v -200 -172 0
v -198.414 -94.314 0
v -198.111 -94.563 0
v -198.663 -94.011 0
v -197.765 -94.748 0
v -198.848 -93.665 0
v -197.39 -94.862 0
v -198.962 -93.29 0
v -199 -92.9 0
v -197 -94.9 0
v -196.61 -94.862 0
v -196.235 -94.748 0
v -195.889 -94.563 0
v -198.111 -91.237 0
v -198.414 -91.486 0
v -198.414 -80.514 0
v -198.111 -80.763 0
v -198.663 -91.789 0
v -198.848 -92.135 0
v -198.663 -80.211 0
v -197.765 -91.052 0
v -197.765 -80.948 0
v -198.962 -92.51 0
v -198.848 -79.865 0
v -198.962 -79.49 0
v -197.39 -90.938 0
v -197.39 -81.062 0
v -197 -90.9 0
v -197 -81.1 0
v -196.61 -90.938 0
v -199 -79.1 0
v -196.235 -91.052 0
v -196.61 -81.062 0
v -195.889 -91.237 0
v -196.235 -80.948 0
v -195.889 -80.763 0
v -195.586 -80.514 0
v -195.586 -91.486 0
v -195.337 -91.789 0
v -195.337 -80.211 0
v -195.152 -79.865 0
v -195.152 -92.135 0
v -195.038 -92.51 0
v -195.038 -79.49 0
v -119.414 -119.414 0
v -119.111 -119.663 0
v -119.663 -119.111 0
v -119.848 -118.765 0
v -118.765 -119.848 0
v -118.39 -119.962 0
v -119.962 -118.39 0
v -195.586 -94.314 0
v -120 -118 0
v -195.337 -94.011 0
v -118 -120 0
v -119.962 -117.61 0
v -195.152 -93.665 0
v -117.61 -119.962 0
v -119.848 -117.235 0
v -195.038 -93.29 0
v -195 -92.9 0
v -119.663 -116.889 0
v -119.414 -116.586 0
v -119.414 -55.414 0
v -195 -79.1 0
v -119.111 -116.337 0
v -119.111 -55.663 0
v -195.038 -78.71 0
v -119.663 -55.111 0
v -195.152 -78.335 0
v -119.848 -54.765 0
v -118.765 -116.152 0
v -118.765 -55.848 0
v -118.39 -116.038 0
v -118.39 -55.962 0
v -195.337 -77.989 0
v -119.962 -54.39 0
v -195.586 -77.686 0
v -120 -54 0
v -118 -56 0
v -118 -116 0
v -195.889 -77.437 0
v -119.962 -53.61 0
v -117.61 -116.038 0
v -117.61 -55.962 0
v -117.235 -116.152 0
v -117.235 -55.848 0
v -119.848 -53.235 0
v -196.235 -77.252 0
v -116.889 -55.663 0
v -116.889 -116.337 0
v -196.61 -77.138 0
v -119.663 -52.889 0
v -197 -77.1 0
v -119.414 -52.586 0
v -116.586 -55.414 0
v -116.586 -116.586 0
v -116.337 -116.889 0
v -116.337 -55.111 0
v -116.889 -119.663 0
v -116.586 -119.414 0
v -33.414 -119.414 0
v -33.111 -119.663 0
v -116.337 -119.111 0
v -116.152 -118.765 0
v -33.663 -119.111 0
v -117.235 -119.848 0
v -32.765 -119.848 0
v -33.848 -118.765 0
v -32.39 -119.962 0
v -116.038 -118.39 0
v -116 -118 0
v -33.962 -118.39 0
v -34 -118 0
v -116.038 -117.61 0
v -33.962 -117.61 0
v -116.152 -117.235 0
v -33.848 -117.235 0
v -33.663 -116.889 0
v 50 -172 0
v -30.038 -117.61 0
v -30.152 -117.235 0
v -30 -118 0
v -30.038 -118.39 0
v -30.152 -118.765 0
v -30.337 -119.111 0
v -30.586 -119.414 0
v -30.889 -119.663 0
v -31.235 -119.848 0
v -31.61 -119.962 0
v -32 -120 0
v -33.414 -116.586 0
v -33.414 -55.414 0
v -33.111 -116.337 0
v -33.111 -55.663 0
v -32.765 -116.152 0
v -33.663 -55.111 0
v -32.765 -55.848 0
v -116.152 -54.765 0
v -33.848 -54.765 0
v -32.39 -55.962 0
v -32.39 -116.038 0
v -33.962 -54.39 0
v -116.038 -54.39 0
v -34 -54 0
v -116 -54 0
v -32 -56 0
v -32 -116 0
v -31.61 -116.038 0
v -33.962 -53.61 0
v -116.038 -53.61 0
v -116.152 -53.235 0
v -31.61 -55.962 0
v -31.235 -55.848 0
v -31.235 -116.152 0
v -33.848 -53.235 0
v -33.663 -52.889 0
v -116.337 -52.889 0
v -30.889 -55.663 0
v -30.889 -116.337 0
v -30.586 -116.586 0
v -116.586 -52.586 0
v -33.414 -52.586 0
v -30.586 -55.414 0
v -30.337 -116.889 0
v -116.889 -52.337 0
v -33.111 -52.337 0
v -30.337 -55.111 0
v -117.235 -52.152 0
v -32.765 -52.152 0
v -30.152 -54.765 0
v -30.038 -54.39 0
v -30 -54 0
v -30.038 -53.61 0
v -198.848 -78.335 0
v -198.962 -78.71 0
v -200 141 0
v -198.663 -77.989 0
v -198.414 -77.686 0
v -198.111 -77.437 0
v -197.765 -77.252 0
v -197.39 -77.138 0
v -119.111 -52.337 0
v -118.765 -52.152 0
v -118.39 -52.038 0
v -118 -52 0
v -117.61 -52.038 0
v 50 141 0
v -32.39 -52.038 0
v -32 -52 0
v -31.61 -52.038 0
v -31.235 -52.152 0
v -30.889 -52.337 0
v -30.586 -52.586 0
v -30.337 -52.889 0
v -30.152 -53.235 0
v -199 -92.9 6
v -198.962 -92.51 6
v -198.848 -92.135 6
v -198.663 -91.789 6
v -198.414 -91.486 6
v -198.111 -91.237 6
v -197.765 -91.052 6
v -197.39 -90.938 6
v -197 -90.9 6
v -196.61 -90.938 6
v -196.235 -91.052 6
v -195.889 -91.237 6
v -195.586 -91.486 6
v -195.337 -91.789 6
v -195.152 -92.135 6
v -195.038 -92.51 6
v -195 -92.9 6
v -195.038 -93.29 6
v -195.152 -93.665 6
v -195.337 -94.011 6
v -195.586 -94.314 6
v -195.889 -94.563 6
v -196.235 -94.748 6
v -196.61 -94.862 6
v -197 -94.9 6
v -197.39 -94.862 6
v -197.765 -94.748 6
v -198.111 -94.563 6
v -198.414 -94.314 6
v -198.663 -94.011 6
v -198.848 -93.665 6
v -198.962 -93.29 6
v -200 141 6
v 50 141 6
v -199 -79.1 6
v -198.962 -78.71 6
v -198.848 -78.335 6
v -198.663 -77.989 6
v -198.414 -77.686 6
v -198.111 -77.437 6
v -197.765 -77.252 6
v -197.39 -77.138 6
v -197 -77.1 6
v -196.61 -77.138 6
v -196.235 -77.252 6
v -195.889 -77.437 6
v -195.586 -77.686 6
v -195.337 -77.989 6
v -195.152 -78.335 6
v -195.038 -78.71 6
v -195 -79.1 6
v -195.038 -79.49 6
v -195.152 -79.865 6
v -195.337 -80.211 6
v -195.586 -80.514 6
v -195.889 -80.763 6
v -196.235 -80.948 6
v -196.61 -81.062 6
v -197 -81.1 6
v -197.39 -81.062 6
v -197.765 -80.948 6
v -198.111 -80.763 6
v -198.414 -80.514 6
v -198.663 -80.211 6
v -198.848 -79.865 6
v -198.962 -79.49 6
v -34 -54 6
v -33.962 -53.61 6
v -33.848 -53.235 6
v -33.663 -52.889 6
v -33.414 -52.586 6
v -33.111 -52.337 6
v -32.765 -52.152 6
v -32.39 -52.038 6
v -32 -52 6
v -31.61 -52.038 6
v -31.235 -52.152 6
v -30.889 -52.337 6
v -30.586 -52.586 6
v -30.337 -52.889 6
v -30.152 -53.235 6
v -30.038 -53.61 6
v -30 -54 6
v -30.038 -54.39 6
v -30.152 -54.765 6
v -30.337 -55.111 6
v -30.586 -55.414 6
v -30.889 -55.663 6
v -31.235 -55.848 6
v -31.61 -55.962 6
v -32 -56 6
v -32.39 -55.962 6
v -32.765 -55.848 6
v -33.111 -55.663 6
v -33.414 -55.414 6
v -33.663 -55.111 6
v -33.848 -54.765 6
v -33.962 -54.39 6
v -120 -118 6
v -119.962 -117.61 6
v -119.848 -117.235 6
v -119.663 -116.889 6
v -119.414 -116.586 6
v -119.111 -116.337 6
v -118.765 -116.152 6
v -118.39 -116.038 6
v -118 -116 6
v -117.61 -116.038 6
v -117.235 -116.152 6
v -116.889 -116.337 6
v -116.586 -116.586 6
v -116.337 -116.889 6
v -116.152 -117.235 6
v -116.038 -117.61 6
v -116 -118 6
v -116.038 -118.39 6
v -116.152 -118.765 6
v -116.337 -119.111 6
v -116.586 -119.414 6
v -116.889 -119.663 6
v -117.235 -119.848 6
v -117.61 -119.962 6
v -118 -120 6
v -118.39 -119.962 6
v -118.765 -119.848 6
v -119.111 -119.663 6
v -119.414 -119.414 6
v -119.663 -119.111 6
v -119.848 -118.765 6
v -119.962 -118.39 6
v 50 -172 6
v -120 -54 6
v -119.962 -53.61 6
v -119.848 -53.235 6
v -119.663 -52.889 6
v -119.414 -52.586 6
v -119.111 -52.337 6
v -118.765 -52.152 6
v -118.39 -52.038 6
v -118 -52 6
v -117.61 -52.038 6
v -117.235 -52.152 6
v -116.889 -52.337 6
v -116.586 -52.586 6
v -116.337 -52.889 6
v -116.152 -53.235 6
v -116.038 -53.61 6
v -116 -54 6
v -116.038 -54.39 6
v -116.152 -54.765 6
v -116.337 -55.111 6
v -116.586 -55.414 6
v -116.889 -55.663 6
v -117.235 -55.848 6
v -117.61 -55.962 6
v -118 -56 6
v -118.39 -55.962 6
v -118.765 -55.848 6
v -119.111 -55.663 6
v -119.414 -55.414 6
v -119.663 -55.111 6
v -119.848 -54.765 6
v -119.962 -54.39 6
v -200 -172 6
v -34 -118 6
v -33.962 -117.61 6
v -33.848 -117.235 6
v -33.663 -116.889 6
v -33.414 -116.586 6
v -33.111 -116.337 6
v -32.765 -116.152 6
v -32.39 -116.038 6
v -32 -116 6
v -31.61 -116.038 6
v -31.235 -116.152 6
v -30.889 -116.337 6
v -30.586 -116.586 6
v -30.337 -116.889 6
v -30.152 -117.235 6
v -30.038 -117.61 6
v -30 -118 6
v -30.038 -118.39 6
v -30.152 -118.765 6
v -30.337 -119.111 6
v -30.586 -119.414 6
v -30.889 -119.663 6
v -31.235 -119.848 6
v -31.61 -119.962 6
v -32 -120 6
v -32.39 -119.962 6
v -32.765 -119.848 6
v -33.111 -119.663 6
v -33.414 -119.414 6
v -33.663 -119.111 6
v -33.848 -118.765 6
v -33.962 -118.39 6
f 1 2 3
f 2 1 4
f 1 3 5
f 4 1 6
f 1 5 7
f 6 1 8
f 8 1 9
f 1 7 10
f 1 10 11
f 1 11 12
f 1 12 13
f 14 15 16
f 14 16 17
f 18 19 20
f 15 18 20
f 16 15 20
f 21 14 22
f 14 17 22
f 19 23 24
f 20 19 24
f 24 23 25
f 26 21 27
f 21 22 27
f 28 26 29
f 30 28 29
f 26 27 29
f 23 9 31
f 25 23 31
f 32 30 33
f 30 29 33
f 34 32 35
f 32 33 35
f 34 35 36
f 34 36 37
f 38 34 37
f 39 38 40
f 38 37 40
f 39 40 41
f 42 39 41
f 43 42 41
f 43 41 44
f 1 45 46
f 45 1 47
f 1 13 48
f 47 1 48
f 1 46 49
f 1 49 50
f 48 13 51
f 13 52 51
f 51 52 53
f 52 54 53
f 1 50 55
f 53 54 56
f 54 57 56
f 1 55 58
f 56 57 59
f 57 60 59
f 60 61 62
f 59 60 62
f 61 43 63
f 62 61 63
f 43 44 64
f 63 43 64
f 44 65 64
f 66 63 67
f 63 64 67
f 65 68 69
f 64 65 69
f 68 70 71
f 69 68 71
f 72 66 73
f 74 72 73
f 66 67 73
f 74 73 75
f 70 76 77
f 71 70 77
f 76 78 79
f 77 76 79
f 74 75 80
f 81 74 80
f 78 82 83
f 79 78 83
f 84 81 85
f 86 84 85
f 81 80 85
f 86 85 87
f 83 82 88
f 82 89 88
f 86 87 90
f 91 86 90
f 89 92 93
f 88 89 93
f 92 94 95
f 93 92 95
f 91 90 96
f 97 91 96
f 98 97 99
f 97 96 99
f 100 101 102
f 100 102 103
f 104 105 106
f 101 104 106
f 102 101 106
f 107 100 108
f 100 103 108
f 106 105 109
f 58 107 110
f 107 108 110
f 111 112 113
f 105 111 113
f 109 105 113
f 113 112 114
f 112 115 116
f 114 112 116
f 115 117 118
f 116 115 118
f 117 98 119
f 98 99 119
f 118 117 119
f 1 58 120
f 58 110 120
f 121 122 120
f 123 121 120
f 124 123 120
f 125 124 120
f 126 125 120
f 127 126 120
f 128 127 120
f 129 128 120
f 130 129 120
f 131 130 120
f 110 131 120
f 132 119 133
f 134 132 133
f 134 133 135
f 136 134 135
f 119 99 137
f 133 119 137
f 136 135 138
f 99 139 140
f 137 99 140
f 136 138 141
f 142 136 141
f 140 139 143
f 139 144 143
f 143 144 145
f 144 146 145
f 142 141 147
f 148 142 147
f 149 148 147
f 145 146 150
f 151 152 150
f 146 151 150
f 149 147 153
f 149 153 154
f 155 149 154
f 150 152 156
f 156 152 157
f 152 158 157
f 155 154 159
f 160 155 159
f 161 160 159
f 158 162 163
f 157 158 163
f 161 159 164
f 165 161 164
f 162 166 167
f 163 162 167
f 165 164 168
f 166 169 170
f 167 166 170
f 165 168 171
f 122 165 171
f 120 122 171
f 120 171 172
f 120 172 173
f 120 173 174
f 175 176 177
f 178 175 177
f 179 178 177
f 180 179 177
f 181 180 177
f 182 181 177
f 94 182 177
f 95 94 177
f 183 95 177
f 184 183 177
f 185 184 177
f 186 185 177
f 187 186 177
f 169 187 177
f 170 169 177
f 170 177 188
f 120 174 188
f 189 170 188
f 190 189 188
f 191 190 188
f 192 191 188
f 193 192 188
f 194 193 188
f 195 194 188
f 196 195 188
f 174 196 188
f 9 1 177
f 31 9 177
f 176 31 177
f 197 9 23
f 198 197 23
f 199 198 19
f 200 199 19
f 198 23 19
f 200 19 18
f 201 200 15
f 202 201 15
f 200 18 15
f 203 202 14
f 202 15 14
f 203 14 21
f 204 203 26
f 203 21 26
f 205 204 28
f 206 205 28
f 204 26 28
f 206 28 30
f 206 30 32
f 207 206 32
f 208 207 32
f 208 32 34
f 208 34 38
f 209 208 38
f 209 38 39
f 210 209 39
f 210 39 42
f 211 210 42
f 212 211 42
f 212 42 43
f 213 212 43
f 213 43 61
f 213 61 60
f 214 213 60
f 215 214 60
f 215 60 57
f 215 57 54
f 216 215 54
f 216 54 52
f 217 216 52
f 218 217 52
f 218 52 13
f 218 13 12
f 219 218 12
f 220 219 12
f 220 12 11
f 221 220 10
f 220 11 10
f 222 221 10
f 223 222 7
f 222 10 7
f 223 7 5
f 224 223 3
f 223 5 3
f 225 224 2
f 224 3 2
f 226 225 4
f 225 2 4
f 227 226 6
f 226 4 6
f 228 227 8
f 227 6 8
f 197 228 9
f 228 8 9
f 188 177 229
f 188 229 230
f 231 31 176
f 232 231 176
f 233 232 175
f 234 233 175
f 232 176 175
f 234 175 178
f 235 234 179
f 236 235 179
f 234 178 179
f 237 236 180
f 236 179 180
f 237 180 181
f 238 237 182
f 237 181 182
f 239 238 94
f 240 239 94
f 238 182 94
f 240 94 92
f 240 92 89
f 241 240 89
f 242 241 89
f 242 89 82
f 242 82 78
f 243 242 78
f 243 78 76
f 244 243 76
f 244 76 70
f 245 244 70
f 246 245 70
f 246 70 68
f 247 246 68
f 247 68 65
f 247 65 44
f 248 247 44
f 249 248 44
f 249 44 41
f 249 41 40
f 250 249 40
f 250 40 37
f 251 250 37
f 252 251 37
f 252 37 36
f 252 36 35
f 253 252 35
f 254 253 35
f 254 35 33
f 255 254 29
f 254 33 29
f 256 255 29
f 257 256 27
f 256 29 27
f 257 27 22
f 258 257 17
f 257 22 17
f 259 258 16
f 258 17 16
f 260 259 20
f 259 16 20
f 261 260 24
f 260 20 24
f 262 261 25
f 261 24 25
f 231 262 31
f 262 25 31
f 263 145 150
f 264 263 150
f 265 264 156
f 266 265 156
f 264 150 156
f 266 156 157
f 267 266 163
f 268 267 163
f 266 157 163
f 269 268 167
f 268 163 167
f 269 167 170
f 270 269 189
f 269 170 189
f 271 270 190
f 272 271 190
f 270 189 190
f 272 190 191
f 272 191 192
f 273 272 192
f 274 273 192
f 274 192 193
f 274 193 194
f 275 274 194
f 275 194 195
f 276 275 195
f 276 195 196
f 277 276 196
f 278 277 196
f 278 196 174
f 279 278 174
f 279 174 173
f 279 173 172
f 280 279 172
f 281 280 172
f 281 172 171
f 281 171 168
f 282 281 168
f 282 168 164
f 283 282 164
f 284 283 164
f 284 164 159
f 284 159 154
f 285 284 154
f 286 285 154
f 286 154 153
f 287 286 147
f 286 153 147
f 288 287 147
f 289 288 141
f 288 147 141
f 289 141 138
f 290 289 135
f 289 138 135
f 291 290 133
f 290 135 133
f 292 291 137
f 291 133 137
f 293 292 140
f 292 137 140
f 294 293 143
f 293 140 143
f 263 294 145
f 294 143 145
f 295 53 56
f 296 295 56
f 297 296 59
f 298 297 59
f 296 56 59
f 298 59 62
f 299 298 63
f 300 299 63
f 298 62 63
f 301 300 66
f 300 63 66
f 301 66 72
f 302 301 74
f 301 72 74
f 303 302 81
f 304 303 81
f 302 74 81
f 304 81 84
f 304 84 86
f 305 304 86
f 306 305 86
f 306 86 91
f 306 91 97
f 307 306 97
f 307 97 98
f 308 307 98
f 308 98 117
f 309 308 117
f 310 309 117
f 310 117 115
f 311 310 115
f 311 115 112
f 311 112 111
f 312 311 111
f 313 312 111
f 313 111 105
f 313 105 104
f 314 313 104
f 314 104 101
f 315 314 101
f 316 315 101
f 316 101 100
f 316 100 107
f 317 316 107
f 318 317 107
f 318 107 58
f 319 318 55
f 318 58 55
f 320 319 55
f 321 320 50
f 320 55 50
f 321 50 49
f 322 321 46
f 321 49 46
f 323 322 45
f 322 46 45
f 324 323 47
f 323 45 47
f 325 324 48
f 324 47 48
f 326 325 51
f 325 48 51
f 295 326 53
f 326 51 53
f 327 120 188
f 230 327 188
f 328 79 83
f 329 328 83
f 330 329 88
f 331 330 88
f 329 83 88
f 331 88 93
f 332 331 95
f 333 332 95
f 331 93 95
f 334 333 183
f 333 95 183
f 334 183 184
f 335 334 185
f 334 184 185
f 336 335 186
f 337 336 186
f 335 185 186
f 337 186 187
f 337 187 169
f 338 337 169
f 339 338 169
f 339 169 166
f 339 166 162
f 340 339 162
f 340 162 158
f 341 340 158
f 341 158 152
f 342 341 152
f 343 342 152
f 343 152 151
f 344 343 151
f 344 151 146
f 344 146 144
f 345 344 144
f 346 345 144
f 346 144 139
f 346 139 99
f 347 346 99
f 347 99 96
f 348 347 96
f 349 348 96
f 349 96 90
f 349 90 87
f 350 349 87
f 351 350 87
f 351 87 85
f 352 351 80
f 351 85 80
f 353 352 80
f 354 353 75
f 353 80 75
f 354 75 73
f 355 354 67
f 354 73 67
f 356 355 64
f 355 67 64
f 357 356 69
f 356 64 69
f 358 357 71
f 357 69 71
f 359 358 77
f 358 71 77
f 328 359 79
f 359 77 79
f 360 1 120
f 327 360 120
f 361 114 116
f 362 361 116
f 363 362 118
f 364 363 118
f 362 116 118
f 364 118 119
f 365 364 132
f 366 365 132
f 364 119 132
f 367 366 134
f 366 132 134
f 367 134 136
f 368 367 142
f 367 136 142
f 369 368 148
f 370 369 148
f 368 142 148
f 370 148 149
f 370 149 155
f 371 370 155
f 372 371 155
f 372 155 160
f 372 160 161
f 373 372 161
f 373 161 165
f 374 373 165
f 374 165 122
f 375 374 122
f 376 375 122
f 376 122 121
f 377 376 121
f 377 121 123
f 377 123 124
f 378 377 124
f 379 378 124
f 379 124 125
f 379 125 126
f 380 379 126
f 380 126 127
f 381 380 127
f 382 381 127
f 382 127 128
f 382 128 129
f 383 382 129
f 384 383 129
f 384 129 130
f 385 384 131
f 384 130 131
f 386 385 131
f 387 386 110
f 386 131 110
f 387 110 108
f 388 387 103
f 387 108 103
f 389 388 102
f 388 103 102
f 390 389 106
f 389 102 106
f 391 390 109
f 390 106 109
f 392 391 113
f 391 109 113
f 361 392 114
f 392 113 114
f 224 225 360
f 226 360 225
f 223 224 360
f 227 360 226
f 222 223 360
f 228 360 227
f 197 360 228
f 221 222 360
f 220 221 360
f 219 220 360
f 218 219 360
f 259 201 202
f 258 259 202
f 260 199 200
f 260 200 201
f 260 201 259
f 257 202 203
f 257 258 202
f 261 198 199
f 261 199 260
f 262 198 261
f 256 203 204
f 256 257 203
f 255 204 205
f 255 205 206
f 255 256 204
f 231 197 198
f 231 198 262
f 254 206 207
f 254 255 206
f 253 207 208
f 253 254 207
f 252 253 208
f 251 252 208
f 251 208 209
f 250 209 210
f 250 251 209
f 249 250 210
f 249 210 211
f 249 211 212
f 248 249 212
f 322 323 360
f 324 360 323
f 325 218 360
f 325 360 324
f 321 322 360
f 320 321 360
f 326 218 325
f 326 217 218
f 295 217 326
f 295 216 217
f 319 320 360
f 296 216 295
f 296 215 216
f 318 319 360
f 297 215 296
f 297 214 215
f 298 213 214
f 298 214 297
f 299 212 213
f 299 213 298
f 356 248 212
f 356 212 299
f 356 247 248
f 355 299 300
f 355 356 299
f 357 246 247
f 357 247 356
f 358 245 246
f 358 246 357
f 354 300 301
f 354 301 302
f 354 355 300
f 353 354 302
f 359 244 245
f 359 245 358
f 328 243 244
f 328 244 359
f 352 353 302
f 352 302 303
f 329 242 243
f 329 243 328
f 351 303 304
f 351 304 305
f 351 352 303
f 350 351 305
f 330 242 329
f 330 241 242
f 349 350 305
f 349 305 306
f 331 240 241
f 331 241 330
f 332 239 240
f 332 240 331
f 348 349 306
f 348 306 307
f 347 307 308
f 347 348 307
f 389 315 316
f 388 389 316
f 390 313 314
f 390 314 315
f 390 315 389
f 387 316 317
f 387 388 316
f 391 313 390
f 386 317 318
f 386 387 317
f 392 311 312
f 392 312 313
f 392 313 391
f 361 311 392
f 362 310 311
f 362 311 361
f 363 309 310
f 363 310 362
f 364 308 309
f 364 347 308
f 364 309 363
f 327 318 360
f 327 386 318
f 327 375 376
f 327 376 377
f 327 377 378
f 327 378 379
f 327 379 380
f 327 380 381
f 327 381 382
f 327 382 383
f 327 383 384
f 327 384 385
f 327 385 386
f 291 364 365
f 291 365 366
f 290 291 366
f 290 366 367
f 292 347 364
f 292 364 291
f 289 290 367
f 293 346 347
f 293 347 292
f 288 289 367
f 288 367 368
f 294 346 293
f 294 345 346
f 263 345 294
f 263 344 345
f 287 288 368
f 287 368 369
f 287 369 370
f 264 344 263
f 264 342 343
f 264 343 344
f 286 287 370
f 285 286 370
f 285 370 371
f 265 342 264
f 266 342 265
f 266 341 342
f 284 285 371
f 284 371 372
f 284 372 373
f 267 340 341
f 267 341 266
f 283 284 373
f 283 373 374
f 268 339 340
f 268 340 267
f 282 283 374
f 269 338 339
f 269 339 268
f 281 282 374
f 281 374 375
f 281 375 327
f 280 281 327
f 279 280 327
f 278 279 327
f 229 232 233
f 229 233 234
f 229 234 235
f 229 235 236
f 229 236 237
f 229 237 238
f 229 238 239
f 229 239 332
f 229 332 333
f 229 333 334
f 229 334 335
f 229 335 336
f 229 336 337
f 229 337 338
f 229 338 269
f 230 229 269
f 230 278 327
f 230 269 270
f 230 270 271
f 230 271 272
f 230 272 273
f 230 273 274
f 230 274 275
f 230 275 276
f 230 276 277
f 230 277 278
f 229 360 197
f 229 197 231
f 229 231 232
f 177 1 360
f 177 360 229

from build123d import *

# Parameters (mm, degrees)
ESQUISSE1_W             = 250
ESQUISSE1_H             = 313
BOSS_EXTRU_1_DEPTH      = 6
ENL_V_MAT_EXTRU_1_REACH = 265.856
ESQUISSE2_R             = 2
ENL_V_MAT_EXTRU_2_REACH = 265.856
ESQUISSE3_R             = 2


with BuildPart() as part:
    # Esquisse1 → Boss.-Extru.1 (new body)
    with BuildSketch(Plane.XY):
        with Locations((-75, -15.5)):
            Rectangle(ESQUISSE1_W, ESQUISSE1_H)
    extrude(amount=BOSS_EXTRU_1_DEPTH)

    # Esquisse2 → Enlèv. mat.-Extru.1 (cut, up to next)
    with BuildSketch(Plane(origin=(0, 0, 0), x_dir=(-1, 0, 0), z_dir=(0, 0, -1)), mode=Mode.PRIVATE) as enl_v_mat_extru_1_sk1:
        with Locations((32, -54)):
            Circle(ESQUISSE2_R)
    enl_v_mat_extru_1_tool1 = extrude(enl_v_mat_extru_1_sk1.sketch, amount=-ENL_V_MAT_EXTRU_1_REACH, mode=Mode.PRIVATE) & part.part
    # Esquisse2 → Enlèv. mat.-Extru.1 (cut, up to next)
    with BuildSketch(Plane(origin=(0, 0, 0), x_dir=(-1, 0, 0), z_dir=(0, 0, -1)), mode=Mode.PRIVATE) as enl_v_mat_extru_1_sk2:
        with Locations((118, -54)):
            Circle(ESQUISSE2_R)
    enl_v_mat_extru_1_tool2 = extrude(enl_v_mat_extru_1_sk2.sketch, amount=-ENL_V_MAT_EXTRU_1_REACH, mode=Mode.PRIVATE) & part.part
    # Esquisse2 → Enlèv. mat.-Extru.1 (cut, up to next)
    with BuildSketch(Plane(origin=(0, 0, 0), x_dir=(-1, 0, 0), z_dir=(0, 0, -1)), mode=Mode.PRIVATE) as enl_v_mat_extru_1_sk3:
        with Locations((118, -118)):
            Circle(ESQUISSE2_R)
    enl_v_mat_extru_1_tool3 = extrude(enl_v_mat_extru_1_sk3.sketch, amount=-ENL_V_MAT_EXTRU_1_REACH, mode=Mode.PRIVATE) & part.part
    # Esquisse2 → Enlèv. mat.-Extru.1 (cut, up to next)
    with BuildSketch(Plane(origin=(0, 0, 0), x_dir=(-1, 0, 0), z_dir=(0, 0, -1)), mode=Mode.PRIVATE) as enl_v_mat_extru_1_sk4:
        with Locations((32, -118)):
            Circle(ESQUISSE2_R)
    enl_v_mat_extru_1_tool4 = extrude(enl_v_mat_extru_1_sk4.sketch, amount=-ENL_V_MAT_EXTRU_1_REACH, mode=Mode.PRIVATE) & part.part
    add(enl_v_mat_extru_1_tool1.solids().sort_by_distance((-32, -54, 0))[0], mode=Mode.SUBTRACT)
    add(enl_v_mat_extru_1_tool2.solids().sort_by_distance((-118, -54, 0))[0], mode=Mode.SUBTRACT)
    add(enl_v_mat_extru_1_tool3.solids().sort_by_distance((-118, -118, 0))[0], mode=Mode.SUBTRACT)
    add(enl_v_mat_extru_1_tool4.solids().sort_by_distance((-32, -118, 0))[0], mode=Mode.SUBTRACT)

    # Esquisse3 → Enlèv. mat.-Extru.2 (cut, up to next)
    with BuildSketch(Plane(origin=(0, 0, 0), x_dir=(-1, 0, 0), z_dir=(0, 0, -1)), mode=Mode.PRIVATE) as enl_v_mat_extru_2_sk1:
        with Locations((197, -79.1)):
            Circle(ESQUISSE3_R)
    enl_v_mat_extru_2_tool1 = extrude(enl_v_mat_extru_2_sk1.sketch, amount=-ENL_V_MAT_EXTRU_2_REACH, mode=Mode.PRIVATE) & part.part
    # Esquisse3 → Enlèv. mat.-Extru.2 (cut, up to next)
    with BuildSketch(Plane(origin=(0, 0, 0), x_dir=(-1, 0, 0), z_dir=(0, 0, -1)), mode=Mode.PRIVATE) as enl_v_mat_extru_2_sk2:
        with Locations((197, -92.9)):
            Circle(ESQUISSE3_R)
    enl_v_mat_extru_2_tool2 = extrude(enl_v_mat_extru_2_sk2.sketch, amount=-ENL_V_MAT_EXTRU_2_REACH, mode=Mode.PRIVATE) & part.part
    add(enl_v_mat_extru_2_tool1.solids().sort_by_distance((-197, -79.1, 0))[0], mode=Mode.SUBTRACT)
    add(enl_v_mat_extru_2_tool2.solids().sort_by_distance((-197, -92.9, 0))[0], mode=Mode.SUBTRACT)


solid = part.part
